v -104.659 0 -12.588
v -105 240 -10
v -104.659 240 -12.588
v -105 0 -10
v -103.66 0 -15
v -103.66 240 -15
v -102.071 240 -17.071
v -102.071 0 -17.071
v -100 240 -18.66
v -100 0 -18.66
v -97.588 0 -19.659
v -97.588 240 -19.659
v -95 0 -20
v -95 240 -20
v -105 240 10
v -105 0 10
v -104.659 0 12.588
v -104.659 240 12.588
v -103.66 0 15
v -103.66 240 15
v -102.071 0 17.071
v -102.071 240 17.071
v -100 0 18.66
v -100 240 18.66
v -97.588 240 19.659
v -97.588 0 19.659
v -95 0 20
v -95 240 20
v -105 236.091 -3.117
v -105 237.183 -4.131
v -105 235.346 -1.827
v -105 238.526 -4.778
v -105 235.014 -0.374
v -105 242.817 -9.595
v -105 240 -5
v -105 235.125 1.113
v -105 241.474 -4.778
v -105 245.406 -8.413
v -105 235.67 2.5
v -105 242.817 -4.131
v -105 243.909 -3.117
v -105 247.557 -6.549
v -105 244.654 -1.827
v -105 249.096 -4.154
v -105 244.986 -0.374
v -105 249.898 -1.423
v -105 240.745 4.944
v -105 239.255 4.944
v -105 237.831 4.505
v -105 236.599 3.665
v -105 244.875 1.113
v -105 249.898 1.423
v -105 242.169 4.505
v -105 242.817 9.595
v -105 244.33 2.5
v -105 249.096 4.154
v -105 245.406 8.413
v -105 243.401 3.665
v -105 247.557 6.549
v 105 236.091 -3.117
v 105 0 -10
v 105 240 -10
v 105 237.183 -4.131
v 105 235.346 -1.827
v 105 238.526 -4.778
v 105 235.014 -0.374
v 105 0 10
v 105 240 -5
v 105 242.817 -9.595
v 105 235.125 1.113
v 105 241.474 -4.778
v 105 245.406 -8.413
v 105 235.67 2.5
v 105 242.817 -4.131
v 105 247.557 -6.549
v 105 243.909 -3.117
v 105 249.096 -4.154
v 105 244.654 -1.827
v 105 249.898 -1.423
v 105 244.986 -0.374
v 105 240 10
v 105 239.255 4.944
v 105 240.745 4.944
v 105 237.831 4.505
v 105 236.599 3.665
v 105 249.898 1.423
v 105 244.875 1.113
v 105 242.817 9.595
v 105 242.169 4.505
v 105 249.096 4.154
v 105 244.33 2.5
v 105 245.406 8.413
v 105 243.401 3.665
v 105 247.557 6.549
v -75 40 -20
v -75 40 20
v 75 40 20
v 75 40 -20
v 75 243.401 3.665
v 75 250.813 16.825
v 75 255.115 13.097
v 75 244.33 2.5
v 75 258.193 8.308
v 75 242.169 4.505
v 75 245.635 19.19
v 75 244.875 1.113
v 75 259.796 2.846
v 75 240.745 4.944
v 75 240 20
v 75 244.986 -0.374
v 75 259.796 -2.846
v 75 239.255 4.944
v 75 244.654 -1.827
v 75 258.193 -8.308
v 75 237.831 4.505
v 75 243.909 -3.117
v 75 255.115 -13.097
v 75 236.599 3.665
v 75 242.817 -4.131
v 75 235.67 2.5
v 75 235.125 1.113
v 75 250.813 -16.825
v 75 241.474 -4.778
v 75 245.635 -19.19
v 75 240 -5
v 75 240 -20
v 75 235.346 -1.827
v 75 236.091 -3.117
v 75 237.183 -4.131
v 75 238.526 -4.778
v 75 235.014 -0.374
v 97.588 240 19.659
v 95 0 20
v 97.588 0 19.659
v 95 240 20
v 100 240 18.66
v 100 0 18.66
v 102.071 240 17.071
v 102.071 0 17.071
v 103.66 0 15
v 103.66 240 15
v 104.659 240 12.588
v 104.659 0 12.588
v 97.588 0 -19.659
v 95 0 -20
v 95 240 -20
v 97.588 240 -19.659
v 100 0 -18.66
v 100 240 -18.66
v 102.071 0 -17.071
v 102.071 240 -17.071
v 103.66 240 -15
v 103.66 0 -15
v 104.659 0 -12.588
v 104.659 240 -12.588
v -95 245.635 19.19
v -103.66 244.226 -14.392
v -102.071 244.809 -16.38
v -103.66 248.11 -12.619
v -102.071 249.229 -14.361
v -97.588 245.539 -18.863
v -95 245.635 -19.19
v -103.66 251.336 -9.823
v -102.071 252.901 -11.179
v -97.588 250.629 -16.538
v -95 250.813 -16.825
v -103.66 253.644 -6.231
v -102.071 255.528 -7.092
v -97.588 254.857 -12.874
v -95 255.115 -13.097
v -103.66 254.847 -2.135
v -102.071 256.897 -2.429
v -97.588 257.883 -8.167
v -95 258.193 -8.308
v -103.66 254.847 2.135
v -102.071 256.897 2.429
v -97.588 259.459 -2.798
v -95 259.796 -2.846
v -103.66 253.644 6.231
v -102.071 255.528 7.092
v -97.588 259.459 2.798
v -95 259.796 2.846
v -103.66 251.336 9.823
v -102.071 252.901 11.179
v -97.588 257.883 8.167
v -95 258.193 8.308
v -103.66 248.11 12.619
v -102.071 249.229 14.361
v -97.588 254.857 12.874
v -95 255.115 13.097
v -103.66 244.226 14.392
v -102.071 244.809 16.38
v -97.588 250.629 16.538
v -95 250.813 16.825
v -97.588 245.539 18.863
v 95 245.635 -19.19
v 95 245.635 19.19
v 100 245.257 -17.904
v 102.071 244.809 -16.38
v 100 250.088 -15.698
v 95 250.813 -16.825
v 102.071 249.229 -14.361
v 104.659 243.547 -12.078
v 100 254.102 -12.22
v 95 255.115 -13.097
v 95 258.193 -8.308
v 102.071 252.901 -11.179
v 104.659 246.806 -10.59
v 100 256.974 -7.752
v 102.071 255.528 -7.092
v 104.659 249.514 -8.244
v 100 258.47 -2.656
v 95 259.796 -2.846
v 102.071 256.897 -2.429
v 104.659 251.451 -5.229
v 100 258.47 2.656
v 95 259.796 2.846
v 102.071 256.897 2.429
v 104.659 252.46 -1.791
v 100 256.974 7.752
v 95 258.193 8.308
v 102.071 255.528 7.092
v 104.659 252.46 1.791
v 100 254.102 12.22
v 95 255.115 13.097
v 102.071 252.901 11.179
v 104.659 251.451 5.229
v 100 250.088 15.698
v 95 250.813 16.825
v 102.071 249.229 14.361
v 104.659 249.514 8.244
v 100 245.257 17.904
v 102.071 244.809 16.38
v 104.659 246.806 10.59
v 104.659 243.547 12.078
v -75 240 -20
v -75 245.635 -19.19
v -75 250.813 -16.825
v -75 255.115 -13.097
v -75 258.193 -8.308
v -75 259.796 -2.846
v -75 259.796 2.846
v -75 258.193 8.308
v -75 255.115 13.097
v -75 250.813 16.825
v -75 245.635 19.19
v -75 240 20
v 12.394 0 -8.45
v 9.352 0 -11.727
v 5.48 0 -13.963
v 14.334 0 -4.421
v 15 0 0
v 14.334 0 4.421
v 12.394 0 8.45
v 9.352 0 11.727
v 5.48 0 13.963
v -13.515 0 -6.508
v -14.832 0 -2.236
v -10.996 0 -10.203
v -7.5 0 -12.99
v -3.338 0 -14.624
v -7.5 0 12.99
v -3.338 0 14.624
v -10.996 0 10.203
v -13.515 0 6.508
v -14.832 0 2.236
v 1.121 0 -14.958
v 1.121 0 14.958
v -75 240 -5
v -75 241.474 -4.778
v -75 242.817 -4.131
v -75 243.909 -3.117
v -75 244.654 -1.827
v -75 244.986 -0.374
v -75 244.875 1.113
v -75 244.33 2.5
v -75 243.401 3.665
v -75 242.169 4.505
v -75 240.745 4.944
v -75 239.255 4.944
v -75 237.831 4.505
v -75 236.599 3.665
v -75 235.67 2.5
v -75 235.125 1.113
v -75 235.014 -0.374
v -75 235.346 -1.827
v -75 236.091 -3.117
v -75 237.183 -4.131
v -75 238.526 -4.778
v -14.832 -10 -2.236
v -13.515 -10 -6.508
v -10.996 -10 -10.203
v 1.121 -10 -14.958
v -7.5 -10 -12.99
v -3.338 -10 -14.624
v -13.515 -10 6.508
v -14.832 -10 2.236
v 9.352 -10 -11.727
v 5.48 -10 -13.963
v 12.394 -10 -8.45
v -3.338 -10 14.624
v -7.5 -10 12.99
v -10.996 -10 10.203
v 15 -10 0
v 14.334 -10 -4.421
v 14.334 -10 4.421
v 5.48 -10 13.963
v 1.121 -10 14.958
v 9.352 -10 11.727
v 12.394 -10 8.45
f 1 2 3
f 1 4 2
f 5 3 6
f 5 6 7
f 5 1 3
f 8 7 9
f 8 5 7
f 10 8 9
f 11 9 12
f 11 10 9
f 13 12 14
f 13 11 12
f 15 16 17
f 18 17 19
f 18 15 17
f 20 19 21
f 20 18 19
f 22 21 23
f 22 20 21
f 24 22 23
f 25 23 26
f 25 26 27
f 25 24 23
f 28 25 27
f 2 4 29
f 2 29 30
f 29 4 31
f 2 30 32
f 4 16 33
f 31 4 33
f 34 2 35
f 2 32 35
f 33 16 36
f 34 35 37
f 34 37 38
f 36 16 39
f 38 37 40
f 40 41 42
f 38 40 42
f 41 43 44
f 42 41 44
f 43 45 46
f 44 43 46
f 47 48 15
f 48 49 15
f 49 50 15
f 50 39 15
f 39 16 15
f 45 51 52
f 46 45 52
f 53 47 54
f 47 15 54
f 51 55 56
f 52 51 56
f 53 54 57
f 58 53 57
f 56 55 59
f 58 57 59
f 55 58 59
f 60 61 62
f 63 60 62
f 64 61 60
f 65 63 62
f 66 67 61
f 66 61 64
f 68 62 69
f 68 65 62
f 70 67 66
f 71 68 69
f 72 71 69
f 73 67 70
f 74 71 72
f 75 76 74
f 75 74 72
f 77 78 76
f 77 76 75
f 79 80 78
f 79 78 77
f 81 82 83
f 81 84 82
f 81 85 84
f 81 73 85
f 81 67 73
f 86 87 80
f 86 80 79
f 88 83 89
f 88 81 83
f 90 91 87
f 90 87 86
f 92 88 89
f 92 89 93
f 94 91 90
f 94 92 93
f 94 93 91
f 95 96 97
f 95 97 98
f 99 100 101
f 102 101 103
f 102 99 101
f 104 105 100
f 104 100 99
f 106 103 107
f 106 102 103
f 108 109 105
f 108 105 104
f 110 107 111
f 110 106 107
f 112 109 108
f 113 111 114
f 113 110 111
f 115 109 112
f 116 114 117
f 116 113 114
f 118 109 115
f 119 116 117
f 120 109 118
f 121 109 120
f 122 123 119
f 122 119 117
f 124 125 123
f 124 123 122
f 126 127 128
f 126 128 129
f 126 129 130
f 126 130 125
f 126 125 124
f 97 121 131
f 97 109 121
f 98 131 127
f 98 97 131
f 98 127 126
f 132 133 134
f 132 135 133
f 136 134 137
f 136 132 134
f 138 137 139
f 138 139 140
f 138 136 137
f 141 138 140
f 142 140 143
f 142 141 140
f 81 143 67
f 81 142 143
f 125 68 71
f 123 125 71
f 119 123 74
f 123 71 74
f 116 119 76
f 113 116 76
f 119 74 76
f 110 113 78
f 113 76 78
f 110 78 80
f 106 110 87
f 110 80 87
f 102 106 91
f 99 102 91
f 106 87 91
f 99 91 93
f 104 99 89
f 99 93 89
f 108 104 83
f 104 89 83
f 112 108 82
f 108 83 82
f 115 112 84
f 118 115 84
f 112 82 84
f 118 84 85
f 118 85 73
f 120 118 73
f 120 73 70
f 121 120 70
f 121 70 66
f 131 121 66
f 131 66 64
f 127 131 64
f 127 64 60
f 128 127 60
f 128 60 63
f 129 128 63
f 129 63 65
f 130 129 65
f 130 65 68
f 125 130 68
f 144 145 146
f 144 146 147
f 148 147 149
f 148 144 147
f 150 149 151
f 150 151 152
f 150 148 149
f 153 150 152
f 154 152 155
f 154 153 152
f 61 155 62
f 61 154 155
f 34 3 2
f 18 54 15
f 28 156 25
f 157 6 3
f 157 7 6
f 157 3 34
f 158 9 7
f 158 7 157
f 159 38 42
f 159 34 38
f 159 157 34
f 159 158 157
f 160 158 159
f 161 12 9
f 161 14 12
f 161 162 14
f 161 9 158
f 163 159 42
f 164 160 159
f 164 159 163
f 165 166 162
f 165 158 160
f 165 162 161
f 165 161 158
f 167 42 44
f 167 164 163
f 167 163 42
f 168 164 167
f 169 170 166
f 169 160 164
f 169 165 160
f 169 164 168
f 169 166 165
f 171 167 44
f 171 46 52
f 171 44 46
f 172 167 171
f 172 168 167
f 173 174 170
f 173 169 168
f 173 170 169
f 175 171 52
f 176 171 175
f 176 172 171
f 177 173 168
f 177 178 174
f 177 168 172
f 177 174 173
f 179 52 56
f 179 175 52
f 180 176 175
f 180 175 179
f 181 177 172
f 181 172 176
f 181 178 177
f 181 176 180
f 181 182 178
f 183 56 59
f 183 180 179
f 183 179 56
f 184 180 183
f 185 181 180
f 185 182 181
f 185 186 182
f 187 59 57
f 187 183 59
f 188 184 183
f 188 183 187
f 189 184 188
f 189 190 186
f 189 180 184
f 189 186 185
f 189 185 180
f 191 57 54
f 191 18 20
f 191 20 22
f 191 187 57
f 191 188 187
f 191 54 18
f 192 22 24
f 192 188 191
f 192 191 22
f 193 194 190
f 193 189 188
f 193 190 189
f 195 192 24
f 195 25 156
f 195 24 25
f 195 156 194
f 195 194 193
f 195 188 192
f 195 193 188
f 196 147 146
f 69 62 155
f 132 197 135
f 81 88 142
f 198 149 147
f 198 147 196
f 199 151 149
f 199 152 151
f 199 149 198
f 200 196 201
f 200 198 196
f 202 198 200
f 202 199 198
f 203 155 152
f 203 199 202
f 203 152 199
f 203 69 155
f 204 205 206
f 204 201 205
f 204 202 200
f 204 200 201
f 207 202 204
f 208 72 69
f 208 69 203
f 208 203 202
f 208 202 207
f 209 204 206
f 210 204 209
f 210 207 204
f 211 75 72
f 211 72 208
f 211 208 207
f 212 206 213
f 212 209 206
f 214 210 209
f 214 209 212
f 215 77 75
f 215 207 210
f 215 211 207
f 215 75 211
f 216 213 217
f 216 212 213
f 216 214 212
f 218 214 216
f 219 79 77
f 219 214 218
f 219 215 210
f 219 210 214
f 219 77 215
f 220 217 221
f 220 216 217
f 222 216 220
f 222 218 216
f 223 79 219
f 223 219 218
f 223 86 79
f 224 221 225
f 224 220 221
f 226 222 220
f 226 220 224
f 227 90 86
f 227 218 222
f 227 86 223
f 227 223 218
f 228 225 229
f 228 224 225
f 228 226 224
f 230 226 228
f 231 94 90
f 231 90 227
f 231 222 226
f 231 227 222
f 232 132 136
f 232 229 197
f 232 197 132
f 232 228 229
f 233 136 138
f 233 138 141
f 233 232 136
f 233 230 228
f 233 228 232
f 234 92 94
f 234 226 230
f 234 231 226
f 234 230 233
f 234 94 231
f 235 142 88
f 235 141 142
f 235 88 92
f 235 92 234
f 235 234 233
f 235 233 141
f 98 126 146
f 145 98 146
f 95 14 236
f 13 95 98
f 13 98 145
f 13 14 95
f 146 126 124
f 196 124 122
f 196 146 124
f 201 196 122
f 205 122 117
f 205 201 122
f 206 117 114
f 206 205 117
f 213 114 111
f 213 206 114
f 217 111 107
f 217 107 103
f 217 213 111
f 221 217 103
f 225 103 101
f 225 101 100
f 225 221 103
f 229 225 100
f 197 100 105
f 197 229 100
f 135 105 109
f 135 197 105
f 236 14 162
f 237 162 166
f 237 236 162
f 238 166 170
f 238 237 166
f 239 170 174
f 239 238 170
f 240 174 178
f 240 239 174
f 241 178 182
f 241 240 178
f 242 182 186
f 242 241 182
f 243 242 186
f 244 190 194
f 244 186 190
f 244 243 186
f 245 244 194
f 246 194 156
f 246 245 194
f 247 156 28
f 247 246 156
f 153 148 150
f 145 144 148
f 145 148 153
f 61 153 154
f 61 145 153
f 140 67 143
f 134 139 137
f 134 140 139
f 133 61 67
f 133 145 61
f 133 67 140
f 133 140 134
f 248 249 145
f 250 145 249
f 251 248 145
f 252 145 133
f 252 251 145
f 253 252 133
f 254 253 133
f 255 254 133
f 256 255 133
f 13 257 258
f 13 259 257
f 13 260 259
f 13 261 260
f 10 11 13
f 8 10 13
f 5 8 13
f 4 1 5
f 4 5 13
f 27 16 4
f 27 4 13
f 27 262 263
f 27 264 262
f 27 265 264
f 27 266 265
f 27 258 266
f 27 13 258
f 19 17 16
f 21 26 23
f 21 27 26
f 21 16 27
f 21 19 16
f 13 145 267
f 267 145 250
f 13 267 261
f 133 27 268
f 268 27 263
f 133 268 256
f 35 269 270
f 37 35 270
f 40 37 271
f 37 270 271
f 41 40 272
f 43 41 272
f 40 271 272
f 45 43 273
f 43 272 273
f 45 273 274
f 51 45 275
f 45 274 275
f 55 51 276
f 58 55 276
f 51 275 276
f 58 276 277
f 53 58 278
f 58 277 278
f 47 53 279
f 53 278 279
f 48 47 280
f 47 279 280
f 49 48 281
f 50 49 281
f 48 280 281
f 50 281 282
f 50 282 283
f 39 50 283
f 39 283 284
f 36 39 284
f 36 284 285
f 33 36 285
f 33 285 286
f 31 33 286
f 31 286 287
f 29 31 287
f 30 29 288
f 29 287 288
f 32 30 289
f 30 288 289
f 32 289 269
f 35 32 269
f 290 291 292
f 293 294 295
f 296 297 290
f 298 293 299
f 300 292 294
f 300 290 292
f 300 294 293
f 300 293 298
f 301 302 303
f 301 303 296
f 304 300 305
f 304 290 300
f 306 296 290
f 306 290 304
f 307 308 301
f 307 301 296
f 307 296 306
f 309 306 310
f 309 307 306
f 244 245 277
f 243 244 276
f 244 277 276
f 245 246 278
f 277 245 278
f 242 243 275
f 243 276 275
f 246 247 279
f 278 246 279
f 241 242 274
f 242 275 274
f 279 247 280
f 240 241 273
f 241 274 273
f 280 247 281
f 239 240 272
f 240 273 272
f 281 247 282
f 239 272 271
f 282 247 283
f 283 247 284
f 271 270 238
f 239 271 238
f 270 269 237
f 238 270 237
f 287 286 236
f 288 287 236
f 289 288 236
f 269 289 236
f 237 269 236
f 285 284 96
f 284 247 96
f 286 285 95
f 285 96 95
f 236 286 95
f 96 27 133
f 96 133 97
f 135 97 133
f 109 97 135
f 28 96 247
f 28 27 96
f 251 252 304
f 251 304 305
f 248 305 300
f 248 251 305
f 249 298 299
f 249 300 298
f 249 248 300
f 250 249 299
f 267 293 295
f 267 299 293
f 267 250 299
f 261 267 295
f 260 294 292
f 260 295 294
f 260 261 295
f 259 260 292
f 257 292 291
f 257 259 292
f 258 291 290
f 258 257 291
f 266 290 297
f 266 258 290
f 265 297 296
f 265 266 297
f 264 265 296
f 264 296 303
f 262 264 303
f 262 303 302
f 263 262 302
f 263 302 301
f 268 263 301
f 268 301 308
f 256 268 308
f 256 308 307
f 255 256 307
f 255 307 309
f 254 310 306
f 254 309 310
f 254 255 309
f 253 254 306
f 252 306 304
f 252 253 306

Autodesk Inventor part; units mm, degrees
ref_plane "YZ Plane" through (0, 0, 0) normal (1, 0, 0) x (0, 1, 0)
ref_plane "XZ Plane" through (0, 0, 0) normal (0, 1, 0) x (-1, 0, 0)
ref_plane "XY Plane" through (0, 0, 0) normal (0, 0, 1) x (1, 0, 0)
sketch "Sketch1" plane through (0, 0, 0) normal (1, 0, 0) x (0, 1, 0)
  line L0 (0, 20) -> (40, 20)
  line L1 (40, 20) -> (40, -20)
  line L2 (40, -20) -> (0, -20)
  line L3 (0, -20) -> (0, 20)
  point P0 (0, 0)
  dimension "d0" = 20
  dimension "d1" = 40
  dimension "d2" = 40
  dimension "d3" = 40
extrude "Extrusion1" add sketch "Sketch1" along normal mid plane 210
sketch "Sketch2" plane through (-105, 40, 20) normal (0, 1, 0) x (1, 0, 0)
  line L0 (210, 40) -> (210, 0) projected
  line L1 (0, 40) -> (210, 40) projected
  line L2 (210, 0) -> (180, 0)
  line L3 (180, 0) -> (180, 40)
  line L4 (180, 40) -> (210, 40)
  line L5 (210, 40) -> (210, 0)
  line L6 (0, 0) -> (210, 0) projected
  line L7 (0, 0) -> (30, 0)
  line L8 (30, 0) -> (30, 40)
  line L9 (30, 40) -> (0, 40)
  line L10 (0, 40) -> (0, 0)
  point P0 (105, 20)
  point P1 (0, 40)
  point P2 (30, 0)
  point P3 (30, 40)
  dimension "d6" = 30
  dimension "d7" = 30
extrude "Extrusion2" add sketch "Sketch2" along normal blind 200 contours L0 L2 L3 L1 | L8 L6 L10 L1
sketch "Sketch3" plane through (-75, 40, 20) normal (1, 0, 0) x (0, 0, -1)
  line L0 (40, 200) -> (0, 200) projected
  circle A0 centre (20, 200) radius 20
  circle A1 centre (20, 200) radius 5
  point P0 (20, -40)
  dimension "d14" = 10
extrude "Extrusion3" add sketch "Sketch3" against normal up to surface (30 mm away)
sketch "Sketch4" plane through (105, 0, 0) normal (1, 0, 0) x (0, 0, -1)
  arc A0 (20, 240) -> (-20, 240) centre (0, 240) ccw projected
  line L0 (-20, 240) -> (20, 240) projected
  circle A1 centre (0, 240) radius 20
  point P0 (0, 0)
  point P1 (-20, 240)
extrude "Extrusion4" add sketch "Sketch4" against normal up to surface (30 mm away)
sketch "Sketch5" plane through (105, 0, 0) normal (1, 0, 0) x (0, 0, -1)
  arc A0 (20, 240) -> (-20, 240) centre (0, 240) ccw projected
  circle A1 centre (0, 240) radius 5
  point P0 (0, 0)
  dimension "d15" = 10
extrude "Extrusion5" cut sketch "Sketch5" against normal through all
fillet "Fillet1" radius 10 6 edges at (105, 120, 20) (105, 120, -20) (105, 260, 0) (-105, 120, -20) (-105, 120, 20) (-105, 260, 0)
sketch "Sketch6" plane through (-95, 0, -20) normal (0, -1, 0) x (1, 0, 0)
  circle A0 centre (95, 20) radius 15
  dimension "d21" = 30
extrude "Extrusion6" add sketch "Sketch6" along normal blind 10
properties part number "AERO - Fork"
